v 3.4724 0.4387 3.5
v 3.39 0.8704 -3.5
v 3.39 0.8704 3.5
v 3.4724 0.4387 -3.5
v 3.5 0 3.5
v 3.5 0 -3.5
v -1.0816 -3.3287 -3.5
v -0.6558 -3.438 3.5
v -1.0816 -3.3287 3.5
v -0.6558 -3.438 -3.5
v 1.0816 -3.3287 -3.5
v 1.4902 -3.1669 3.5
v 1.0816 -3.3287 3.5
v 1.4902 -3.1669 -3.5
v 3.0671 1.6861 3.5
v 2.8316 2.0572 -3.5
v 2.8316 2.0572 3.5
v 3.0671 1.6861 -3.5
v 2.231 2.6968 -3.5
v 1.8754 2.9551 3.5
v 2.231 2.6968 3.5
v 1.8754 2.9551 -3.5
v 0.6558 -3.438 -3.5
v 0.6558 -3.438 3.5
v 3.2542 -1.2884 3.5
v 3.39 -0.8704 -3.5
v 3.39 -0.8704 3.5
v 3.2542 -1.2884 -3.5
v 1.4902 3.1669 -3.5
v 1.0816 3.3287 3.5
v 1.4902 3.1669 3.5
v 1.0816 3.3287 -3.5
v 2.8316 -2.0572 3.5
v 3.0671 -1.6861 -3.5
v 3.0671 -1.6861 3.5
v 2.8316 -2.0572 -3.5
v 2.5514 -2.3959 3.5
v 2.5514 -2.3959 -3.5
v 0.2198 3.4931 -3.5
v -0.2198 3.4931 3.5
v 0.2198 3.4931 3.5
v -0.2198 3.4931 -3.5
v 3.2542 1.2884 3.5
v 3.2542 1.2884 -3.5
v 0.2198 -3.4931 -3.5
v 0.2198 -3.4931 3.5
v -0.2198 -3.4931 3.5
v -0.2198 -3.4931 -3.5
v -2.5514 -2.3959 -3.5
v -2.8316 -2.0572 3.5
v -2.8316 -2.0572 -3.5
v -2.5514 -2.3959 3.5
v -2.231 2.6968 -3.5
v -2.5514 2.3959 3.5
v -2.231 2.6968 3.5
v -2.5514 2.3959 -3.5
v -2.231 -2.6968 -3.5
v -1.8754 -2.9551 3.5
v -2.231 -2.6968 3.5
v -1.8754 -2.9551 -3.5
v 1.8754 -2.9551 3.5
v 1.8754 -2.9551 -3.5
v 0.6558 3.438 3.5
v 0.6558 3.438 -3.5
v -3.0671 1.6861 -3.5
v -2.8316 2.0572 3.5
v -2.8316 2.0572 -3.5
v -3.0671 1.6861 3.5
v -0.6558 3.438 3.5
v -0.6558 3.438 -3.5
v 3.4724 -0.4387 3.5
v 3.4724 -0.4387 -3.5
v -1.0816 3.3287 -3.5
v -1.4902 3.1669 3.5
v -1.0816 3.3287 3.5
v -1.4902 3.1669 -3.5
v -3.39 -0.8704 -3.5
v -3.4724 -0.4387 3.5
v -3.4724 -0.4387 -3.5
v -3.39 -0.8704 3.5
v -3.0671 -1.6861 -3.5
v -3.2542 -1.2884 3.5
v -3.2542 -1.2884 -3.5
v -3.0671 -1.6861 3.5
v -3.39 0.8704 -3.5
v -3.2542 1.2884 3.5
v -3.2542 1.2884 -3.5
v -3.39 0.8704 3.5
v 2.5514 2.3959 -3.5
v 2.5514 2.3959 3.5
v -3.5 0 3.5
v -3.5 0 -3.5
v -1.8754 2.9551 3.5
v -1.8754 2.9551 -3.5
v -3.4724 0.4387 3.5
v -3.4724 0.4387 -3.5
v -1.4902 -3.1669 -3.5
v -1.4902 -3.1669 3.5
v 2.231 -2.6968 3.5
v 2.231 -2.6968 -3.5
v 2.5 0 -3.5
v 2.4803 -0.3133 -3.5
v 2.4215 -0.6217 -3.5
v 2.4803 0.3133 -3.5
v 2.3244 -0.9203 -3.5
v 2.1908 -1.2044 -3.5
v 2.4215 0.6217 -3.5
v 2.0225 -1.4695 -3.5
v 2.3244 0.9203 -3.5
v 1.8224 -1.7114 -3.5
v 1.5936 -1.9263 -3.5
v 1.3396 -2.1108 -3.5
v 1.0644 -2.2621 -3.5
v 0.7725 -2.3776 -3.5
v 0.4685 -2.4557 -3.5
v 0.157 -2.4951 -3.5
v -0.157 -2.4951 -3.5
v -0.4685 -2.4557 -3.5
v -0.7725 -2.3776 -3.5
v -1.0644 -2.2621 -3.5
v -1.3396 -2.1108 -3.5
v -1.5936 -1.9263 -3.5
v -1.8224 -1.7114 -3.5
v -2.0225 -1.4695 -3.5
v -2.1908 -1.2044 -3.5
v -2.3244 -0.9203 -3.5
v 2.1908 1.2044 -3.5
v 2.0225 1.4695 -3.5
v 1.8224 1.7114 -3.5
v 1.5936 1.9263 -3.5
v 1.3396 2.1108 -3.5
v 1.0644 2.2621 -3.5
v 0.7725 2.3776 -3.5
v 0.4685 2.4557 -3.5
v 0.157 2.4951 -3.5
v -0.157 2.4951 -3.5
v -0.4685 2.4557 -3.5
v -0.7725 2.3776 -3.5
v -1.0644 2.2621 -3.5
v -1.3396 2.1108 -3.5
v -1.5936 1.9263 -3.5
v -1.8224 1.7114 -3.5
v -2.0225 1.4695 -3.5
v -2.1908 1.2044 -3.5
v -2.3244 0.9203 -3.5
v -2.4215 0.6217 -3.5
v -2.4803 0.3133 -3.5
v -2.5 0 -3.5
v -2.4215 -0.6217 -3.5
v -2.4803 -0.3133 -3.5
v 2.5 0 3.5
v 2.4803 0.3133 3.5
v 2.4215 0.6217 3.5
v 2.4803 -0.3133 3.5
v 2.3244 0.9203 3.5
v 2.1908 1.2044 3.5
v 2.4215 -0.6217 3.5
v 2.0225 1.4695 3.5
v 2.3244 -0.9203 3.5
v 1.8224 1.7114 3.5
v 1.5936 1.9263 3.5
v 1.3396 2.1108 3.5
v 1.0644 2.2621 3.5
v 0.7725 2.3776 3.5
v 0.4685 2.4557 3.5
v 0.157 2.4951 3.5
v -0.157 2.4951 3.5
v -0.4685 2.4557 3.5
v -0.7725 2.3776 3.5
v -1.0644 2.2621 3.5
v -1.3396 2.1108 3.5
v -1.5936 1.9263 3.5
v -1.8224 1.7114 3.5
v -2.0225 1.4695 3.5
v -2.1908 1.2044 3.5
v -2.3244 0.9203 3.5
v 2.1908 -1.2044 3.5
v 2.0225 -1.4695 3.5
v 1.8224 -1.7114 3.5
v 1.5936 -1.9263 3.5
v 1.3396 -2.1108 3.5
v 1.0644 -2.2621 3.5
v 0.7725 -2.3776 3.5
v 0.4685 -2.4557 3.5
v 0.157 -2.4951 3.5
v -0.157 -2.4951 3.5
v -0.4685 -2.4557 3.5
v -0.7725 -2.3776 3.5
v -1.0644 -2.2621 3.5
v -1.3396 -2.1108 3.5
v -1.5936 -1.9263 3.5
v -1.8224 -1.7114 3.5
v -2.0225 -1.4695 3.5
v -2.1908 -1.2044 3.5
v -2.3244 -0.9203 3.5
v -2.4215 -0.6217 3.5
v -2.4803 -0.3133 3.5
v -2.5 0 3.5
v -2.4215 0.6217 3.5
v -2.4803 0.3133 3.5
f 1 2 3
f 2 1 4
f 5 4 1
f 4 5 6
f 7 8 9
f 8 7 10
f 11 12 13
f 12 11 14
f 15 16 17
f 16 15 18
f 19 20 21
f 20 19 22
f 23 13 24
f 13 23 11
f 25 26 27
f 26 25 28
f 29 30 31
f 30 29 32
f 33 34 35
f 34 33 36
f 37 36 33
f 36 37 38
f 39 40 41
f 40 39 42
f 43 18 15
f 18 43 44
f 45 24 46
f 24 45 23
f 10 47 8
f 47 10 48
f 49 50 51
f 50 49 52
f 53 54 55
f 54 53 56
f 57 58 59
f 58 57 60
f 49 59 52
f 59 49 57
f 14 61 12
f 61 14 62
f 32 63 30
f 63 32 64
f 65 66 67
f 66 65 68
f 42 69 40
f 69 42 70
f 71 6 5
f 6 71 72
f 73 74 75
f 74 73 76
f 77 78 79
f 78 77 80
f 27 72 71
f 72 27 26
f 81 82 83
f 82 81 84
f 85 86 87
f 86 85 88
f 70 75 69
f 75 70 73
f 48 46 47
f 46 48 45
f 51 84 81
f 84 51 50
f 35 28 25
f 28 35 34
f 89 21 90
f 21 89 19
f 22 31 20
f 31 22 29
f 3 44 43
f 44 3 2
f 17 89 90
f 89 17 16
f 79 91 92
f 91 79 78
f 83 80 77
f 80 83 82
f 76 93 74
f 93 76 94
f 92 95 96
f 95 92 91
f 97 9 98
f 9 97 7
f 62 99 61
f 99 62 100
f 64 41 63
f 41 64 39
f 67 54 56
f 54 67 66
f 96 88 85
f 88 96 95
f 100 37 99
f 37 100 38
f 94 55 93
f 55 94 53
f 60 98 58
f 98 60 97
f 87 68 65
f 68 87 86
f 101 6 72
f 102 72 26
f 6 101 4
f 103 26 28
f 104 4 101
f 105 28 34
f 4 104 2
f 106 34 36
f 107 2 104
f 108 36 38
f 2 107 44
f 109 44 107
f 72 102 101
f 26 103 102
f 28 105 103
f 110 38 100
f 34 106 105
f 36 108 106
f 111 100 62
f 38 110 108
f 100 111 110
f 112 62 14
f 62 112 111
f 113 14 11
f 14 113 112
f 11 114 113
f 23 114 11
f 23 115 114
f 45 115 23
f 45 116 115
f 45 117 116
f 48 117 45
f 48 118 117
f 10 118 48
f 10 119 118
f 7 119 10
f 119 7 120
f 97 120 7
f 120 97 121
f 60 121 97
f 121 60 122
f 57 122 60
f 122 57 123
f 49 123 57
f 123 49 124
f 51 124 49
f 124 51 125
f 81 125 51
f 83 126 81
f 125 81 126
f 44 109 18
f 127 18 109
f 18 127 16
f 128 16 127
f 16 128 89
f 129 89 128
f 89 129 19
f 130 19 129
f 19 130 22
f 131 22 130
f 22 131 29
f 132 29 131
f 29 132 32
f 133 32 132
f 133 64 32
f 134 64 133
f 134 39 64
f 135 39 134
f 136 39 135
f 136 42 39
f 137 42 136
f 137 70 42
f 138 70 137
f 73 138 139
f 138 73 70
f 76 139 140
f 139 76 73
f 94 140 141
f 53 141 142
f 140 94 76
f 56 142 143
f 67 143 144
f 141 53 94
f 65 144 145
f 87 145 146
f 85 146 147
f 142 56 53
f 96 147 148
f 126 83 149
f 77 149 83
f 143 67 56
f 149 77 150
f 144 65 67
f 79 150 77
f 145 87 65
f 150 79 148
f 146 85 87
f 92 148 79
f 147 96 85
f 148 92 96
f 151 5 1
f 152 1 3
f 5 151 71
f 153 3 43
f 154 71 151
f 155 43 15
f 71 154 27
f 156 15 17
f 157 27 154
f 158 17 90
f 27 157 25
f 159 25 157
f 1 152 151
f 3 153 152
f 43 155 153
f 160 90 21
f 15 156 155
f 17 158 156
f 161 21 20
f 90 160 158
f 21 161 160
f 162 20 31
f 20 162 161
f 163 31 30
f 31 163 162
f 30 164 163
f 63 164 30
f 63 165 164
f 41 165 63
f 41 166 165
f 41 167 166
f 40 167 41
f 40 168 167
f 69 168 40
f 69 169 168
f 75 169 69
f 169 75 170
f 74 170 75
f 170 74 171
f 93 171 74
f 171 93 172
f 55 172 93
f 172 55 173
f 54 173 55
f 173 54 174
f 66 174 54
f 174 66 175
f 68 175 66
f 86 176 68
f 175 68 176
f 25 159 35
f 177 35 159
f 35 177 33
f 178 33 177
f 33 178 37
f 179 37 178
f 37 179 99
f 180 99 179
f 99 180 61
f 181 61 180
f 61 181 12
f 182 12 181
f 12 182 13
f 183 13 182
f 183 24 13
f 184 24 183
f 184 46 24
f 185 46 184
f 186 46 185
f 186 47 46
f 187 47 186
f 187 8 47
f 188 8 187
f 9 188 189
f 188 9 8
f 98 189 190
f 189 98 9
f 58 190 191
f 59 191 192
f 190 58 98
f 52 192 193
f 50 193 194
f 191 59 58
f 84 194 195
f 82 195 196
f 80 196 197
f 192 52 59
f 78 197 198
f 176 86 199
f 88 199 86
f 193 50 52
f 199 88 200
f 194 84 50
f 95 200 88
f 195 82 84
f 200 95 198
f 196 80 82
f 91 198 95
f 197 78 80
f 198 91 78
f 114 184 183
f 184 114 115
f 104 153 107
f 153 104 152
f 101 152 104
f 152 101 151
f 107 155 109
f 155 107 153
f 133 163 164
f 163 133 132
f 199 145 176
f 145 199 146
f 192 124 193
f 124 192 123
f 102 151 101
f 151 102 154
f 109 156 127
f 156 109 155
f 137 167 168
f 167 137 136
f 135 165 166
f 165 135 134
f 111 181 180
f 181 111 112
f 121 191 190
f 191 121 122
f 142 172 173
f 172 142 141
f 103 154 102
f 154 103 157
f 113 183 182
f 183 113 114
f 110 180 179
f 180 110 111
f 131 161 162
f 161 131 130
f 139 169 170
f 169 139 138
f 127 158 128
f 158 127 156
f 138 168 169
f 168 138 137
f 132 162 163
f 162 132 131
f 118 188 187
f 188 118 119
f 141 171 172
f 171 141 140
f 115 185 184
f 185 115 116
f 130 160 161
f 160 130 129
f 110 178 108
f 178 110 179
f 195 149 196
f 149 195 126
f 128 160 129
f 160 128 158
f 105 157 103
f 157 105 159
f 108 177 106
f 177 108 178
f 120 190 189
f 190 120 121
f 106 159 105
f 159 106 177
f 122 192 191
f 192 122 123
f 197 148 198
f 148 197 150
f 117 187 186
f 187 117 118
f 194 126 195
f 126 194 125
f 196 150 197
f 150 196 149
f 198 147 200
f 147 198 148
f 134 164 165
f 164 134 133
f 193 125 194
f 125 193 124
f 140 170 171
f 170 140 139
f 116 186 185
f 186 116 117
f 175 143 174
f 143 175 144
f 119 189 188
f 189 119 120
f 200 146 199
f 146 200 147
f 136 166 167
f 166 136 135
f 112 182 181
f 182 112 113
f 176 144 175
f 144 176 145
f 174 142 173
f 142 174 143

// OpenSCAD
$fn = 50;


difference() {
	union() {
		translate(v = [0, 0, -3.5000000000]) {
			cylinder(h = 7, r = 3.5000000000);
		}
	}
	union() {
		translate(v = [0, 0, -100.0000000000]) {
			cylinder(h = 200, r = 2.5000000000);
		}
	}
}
